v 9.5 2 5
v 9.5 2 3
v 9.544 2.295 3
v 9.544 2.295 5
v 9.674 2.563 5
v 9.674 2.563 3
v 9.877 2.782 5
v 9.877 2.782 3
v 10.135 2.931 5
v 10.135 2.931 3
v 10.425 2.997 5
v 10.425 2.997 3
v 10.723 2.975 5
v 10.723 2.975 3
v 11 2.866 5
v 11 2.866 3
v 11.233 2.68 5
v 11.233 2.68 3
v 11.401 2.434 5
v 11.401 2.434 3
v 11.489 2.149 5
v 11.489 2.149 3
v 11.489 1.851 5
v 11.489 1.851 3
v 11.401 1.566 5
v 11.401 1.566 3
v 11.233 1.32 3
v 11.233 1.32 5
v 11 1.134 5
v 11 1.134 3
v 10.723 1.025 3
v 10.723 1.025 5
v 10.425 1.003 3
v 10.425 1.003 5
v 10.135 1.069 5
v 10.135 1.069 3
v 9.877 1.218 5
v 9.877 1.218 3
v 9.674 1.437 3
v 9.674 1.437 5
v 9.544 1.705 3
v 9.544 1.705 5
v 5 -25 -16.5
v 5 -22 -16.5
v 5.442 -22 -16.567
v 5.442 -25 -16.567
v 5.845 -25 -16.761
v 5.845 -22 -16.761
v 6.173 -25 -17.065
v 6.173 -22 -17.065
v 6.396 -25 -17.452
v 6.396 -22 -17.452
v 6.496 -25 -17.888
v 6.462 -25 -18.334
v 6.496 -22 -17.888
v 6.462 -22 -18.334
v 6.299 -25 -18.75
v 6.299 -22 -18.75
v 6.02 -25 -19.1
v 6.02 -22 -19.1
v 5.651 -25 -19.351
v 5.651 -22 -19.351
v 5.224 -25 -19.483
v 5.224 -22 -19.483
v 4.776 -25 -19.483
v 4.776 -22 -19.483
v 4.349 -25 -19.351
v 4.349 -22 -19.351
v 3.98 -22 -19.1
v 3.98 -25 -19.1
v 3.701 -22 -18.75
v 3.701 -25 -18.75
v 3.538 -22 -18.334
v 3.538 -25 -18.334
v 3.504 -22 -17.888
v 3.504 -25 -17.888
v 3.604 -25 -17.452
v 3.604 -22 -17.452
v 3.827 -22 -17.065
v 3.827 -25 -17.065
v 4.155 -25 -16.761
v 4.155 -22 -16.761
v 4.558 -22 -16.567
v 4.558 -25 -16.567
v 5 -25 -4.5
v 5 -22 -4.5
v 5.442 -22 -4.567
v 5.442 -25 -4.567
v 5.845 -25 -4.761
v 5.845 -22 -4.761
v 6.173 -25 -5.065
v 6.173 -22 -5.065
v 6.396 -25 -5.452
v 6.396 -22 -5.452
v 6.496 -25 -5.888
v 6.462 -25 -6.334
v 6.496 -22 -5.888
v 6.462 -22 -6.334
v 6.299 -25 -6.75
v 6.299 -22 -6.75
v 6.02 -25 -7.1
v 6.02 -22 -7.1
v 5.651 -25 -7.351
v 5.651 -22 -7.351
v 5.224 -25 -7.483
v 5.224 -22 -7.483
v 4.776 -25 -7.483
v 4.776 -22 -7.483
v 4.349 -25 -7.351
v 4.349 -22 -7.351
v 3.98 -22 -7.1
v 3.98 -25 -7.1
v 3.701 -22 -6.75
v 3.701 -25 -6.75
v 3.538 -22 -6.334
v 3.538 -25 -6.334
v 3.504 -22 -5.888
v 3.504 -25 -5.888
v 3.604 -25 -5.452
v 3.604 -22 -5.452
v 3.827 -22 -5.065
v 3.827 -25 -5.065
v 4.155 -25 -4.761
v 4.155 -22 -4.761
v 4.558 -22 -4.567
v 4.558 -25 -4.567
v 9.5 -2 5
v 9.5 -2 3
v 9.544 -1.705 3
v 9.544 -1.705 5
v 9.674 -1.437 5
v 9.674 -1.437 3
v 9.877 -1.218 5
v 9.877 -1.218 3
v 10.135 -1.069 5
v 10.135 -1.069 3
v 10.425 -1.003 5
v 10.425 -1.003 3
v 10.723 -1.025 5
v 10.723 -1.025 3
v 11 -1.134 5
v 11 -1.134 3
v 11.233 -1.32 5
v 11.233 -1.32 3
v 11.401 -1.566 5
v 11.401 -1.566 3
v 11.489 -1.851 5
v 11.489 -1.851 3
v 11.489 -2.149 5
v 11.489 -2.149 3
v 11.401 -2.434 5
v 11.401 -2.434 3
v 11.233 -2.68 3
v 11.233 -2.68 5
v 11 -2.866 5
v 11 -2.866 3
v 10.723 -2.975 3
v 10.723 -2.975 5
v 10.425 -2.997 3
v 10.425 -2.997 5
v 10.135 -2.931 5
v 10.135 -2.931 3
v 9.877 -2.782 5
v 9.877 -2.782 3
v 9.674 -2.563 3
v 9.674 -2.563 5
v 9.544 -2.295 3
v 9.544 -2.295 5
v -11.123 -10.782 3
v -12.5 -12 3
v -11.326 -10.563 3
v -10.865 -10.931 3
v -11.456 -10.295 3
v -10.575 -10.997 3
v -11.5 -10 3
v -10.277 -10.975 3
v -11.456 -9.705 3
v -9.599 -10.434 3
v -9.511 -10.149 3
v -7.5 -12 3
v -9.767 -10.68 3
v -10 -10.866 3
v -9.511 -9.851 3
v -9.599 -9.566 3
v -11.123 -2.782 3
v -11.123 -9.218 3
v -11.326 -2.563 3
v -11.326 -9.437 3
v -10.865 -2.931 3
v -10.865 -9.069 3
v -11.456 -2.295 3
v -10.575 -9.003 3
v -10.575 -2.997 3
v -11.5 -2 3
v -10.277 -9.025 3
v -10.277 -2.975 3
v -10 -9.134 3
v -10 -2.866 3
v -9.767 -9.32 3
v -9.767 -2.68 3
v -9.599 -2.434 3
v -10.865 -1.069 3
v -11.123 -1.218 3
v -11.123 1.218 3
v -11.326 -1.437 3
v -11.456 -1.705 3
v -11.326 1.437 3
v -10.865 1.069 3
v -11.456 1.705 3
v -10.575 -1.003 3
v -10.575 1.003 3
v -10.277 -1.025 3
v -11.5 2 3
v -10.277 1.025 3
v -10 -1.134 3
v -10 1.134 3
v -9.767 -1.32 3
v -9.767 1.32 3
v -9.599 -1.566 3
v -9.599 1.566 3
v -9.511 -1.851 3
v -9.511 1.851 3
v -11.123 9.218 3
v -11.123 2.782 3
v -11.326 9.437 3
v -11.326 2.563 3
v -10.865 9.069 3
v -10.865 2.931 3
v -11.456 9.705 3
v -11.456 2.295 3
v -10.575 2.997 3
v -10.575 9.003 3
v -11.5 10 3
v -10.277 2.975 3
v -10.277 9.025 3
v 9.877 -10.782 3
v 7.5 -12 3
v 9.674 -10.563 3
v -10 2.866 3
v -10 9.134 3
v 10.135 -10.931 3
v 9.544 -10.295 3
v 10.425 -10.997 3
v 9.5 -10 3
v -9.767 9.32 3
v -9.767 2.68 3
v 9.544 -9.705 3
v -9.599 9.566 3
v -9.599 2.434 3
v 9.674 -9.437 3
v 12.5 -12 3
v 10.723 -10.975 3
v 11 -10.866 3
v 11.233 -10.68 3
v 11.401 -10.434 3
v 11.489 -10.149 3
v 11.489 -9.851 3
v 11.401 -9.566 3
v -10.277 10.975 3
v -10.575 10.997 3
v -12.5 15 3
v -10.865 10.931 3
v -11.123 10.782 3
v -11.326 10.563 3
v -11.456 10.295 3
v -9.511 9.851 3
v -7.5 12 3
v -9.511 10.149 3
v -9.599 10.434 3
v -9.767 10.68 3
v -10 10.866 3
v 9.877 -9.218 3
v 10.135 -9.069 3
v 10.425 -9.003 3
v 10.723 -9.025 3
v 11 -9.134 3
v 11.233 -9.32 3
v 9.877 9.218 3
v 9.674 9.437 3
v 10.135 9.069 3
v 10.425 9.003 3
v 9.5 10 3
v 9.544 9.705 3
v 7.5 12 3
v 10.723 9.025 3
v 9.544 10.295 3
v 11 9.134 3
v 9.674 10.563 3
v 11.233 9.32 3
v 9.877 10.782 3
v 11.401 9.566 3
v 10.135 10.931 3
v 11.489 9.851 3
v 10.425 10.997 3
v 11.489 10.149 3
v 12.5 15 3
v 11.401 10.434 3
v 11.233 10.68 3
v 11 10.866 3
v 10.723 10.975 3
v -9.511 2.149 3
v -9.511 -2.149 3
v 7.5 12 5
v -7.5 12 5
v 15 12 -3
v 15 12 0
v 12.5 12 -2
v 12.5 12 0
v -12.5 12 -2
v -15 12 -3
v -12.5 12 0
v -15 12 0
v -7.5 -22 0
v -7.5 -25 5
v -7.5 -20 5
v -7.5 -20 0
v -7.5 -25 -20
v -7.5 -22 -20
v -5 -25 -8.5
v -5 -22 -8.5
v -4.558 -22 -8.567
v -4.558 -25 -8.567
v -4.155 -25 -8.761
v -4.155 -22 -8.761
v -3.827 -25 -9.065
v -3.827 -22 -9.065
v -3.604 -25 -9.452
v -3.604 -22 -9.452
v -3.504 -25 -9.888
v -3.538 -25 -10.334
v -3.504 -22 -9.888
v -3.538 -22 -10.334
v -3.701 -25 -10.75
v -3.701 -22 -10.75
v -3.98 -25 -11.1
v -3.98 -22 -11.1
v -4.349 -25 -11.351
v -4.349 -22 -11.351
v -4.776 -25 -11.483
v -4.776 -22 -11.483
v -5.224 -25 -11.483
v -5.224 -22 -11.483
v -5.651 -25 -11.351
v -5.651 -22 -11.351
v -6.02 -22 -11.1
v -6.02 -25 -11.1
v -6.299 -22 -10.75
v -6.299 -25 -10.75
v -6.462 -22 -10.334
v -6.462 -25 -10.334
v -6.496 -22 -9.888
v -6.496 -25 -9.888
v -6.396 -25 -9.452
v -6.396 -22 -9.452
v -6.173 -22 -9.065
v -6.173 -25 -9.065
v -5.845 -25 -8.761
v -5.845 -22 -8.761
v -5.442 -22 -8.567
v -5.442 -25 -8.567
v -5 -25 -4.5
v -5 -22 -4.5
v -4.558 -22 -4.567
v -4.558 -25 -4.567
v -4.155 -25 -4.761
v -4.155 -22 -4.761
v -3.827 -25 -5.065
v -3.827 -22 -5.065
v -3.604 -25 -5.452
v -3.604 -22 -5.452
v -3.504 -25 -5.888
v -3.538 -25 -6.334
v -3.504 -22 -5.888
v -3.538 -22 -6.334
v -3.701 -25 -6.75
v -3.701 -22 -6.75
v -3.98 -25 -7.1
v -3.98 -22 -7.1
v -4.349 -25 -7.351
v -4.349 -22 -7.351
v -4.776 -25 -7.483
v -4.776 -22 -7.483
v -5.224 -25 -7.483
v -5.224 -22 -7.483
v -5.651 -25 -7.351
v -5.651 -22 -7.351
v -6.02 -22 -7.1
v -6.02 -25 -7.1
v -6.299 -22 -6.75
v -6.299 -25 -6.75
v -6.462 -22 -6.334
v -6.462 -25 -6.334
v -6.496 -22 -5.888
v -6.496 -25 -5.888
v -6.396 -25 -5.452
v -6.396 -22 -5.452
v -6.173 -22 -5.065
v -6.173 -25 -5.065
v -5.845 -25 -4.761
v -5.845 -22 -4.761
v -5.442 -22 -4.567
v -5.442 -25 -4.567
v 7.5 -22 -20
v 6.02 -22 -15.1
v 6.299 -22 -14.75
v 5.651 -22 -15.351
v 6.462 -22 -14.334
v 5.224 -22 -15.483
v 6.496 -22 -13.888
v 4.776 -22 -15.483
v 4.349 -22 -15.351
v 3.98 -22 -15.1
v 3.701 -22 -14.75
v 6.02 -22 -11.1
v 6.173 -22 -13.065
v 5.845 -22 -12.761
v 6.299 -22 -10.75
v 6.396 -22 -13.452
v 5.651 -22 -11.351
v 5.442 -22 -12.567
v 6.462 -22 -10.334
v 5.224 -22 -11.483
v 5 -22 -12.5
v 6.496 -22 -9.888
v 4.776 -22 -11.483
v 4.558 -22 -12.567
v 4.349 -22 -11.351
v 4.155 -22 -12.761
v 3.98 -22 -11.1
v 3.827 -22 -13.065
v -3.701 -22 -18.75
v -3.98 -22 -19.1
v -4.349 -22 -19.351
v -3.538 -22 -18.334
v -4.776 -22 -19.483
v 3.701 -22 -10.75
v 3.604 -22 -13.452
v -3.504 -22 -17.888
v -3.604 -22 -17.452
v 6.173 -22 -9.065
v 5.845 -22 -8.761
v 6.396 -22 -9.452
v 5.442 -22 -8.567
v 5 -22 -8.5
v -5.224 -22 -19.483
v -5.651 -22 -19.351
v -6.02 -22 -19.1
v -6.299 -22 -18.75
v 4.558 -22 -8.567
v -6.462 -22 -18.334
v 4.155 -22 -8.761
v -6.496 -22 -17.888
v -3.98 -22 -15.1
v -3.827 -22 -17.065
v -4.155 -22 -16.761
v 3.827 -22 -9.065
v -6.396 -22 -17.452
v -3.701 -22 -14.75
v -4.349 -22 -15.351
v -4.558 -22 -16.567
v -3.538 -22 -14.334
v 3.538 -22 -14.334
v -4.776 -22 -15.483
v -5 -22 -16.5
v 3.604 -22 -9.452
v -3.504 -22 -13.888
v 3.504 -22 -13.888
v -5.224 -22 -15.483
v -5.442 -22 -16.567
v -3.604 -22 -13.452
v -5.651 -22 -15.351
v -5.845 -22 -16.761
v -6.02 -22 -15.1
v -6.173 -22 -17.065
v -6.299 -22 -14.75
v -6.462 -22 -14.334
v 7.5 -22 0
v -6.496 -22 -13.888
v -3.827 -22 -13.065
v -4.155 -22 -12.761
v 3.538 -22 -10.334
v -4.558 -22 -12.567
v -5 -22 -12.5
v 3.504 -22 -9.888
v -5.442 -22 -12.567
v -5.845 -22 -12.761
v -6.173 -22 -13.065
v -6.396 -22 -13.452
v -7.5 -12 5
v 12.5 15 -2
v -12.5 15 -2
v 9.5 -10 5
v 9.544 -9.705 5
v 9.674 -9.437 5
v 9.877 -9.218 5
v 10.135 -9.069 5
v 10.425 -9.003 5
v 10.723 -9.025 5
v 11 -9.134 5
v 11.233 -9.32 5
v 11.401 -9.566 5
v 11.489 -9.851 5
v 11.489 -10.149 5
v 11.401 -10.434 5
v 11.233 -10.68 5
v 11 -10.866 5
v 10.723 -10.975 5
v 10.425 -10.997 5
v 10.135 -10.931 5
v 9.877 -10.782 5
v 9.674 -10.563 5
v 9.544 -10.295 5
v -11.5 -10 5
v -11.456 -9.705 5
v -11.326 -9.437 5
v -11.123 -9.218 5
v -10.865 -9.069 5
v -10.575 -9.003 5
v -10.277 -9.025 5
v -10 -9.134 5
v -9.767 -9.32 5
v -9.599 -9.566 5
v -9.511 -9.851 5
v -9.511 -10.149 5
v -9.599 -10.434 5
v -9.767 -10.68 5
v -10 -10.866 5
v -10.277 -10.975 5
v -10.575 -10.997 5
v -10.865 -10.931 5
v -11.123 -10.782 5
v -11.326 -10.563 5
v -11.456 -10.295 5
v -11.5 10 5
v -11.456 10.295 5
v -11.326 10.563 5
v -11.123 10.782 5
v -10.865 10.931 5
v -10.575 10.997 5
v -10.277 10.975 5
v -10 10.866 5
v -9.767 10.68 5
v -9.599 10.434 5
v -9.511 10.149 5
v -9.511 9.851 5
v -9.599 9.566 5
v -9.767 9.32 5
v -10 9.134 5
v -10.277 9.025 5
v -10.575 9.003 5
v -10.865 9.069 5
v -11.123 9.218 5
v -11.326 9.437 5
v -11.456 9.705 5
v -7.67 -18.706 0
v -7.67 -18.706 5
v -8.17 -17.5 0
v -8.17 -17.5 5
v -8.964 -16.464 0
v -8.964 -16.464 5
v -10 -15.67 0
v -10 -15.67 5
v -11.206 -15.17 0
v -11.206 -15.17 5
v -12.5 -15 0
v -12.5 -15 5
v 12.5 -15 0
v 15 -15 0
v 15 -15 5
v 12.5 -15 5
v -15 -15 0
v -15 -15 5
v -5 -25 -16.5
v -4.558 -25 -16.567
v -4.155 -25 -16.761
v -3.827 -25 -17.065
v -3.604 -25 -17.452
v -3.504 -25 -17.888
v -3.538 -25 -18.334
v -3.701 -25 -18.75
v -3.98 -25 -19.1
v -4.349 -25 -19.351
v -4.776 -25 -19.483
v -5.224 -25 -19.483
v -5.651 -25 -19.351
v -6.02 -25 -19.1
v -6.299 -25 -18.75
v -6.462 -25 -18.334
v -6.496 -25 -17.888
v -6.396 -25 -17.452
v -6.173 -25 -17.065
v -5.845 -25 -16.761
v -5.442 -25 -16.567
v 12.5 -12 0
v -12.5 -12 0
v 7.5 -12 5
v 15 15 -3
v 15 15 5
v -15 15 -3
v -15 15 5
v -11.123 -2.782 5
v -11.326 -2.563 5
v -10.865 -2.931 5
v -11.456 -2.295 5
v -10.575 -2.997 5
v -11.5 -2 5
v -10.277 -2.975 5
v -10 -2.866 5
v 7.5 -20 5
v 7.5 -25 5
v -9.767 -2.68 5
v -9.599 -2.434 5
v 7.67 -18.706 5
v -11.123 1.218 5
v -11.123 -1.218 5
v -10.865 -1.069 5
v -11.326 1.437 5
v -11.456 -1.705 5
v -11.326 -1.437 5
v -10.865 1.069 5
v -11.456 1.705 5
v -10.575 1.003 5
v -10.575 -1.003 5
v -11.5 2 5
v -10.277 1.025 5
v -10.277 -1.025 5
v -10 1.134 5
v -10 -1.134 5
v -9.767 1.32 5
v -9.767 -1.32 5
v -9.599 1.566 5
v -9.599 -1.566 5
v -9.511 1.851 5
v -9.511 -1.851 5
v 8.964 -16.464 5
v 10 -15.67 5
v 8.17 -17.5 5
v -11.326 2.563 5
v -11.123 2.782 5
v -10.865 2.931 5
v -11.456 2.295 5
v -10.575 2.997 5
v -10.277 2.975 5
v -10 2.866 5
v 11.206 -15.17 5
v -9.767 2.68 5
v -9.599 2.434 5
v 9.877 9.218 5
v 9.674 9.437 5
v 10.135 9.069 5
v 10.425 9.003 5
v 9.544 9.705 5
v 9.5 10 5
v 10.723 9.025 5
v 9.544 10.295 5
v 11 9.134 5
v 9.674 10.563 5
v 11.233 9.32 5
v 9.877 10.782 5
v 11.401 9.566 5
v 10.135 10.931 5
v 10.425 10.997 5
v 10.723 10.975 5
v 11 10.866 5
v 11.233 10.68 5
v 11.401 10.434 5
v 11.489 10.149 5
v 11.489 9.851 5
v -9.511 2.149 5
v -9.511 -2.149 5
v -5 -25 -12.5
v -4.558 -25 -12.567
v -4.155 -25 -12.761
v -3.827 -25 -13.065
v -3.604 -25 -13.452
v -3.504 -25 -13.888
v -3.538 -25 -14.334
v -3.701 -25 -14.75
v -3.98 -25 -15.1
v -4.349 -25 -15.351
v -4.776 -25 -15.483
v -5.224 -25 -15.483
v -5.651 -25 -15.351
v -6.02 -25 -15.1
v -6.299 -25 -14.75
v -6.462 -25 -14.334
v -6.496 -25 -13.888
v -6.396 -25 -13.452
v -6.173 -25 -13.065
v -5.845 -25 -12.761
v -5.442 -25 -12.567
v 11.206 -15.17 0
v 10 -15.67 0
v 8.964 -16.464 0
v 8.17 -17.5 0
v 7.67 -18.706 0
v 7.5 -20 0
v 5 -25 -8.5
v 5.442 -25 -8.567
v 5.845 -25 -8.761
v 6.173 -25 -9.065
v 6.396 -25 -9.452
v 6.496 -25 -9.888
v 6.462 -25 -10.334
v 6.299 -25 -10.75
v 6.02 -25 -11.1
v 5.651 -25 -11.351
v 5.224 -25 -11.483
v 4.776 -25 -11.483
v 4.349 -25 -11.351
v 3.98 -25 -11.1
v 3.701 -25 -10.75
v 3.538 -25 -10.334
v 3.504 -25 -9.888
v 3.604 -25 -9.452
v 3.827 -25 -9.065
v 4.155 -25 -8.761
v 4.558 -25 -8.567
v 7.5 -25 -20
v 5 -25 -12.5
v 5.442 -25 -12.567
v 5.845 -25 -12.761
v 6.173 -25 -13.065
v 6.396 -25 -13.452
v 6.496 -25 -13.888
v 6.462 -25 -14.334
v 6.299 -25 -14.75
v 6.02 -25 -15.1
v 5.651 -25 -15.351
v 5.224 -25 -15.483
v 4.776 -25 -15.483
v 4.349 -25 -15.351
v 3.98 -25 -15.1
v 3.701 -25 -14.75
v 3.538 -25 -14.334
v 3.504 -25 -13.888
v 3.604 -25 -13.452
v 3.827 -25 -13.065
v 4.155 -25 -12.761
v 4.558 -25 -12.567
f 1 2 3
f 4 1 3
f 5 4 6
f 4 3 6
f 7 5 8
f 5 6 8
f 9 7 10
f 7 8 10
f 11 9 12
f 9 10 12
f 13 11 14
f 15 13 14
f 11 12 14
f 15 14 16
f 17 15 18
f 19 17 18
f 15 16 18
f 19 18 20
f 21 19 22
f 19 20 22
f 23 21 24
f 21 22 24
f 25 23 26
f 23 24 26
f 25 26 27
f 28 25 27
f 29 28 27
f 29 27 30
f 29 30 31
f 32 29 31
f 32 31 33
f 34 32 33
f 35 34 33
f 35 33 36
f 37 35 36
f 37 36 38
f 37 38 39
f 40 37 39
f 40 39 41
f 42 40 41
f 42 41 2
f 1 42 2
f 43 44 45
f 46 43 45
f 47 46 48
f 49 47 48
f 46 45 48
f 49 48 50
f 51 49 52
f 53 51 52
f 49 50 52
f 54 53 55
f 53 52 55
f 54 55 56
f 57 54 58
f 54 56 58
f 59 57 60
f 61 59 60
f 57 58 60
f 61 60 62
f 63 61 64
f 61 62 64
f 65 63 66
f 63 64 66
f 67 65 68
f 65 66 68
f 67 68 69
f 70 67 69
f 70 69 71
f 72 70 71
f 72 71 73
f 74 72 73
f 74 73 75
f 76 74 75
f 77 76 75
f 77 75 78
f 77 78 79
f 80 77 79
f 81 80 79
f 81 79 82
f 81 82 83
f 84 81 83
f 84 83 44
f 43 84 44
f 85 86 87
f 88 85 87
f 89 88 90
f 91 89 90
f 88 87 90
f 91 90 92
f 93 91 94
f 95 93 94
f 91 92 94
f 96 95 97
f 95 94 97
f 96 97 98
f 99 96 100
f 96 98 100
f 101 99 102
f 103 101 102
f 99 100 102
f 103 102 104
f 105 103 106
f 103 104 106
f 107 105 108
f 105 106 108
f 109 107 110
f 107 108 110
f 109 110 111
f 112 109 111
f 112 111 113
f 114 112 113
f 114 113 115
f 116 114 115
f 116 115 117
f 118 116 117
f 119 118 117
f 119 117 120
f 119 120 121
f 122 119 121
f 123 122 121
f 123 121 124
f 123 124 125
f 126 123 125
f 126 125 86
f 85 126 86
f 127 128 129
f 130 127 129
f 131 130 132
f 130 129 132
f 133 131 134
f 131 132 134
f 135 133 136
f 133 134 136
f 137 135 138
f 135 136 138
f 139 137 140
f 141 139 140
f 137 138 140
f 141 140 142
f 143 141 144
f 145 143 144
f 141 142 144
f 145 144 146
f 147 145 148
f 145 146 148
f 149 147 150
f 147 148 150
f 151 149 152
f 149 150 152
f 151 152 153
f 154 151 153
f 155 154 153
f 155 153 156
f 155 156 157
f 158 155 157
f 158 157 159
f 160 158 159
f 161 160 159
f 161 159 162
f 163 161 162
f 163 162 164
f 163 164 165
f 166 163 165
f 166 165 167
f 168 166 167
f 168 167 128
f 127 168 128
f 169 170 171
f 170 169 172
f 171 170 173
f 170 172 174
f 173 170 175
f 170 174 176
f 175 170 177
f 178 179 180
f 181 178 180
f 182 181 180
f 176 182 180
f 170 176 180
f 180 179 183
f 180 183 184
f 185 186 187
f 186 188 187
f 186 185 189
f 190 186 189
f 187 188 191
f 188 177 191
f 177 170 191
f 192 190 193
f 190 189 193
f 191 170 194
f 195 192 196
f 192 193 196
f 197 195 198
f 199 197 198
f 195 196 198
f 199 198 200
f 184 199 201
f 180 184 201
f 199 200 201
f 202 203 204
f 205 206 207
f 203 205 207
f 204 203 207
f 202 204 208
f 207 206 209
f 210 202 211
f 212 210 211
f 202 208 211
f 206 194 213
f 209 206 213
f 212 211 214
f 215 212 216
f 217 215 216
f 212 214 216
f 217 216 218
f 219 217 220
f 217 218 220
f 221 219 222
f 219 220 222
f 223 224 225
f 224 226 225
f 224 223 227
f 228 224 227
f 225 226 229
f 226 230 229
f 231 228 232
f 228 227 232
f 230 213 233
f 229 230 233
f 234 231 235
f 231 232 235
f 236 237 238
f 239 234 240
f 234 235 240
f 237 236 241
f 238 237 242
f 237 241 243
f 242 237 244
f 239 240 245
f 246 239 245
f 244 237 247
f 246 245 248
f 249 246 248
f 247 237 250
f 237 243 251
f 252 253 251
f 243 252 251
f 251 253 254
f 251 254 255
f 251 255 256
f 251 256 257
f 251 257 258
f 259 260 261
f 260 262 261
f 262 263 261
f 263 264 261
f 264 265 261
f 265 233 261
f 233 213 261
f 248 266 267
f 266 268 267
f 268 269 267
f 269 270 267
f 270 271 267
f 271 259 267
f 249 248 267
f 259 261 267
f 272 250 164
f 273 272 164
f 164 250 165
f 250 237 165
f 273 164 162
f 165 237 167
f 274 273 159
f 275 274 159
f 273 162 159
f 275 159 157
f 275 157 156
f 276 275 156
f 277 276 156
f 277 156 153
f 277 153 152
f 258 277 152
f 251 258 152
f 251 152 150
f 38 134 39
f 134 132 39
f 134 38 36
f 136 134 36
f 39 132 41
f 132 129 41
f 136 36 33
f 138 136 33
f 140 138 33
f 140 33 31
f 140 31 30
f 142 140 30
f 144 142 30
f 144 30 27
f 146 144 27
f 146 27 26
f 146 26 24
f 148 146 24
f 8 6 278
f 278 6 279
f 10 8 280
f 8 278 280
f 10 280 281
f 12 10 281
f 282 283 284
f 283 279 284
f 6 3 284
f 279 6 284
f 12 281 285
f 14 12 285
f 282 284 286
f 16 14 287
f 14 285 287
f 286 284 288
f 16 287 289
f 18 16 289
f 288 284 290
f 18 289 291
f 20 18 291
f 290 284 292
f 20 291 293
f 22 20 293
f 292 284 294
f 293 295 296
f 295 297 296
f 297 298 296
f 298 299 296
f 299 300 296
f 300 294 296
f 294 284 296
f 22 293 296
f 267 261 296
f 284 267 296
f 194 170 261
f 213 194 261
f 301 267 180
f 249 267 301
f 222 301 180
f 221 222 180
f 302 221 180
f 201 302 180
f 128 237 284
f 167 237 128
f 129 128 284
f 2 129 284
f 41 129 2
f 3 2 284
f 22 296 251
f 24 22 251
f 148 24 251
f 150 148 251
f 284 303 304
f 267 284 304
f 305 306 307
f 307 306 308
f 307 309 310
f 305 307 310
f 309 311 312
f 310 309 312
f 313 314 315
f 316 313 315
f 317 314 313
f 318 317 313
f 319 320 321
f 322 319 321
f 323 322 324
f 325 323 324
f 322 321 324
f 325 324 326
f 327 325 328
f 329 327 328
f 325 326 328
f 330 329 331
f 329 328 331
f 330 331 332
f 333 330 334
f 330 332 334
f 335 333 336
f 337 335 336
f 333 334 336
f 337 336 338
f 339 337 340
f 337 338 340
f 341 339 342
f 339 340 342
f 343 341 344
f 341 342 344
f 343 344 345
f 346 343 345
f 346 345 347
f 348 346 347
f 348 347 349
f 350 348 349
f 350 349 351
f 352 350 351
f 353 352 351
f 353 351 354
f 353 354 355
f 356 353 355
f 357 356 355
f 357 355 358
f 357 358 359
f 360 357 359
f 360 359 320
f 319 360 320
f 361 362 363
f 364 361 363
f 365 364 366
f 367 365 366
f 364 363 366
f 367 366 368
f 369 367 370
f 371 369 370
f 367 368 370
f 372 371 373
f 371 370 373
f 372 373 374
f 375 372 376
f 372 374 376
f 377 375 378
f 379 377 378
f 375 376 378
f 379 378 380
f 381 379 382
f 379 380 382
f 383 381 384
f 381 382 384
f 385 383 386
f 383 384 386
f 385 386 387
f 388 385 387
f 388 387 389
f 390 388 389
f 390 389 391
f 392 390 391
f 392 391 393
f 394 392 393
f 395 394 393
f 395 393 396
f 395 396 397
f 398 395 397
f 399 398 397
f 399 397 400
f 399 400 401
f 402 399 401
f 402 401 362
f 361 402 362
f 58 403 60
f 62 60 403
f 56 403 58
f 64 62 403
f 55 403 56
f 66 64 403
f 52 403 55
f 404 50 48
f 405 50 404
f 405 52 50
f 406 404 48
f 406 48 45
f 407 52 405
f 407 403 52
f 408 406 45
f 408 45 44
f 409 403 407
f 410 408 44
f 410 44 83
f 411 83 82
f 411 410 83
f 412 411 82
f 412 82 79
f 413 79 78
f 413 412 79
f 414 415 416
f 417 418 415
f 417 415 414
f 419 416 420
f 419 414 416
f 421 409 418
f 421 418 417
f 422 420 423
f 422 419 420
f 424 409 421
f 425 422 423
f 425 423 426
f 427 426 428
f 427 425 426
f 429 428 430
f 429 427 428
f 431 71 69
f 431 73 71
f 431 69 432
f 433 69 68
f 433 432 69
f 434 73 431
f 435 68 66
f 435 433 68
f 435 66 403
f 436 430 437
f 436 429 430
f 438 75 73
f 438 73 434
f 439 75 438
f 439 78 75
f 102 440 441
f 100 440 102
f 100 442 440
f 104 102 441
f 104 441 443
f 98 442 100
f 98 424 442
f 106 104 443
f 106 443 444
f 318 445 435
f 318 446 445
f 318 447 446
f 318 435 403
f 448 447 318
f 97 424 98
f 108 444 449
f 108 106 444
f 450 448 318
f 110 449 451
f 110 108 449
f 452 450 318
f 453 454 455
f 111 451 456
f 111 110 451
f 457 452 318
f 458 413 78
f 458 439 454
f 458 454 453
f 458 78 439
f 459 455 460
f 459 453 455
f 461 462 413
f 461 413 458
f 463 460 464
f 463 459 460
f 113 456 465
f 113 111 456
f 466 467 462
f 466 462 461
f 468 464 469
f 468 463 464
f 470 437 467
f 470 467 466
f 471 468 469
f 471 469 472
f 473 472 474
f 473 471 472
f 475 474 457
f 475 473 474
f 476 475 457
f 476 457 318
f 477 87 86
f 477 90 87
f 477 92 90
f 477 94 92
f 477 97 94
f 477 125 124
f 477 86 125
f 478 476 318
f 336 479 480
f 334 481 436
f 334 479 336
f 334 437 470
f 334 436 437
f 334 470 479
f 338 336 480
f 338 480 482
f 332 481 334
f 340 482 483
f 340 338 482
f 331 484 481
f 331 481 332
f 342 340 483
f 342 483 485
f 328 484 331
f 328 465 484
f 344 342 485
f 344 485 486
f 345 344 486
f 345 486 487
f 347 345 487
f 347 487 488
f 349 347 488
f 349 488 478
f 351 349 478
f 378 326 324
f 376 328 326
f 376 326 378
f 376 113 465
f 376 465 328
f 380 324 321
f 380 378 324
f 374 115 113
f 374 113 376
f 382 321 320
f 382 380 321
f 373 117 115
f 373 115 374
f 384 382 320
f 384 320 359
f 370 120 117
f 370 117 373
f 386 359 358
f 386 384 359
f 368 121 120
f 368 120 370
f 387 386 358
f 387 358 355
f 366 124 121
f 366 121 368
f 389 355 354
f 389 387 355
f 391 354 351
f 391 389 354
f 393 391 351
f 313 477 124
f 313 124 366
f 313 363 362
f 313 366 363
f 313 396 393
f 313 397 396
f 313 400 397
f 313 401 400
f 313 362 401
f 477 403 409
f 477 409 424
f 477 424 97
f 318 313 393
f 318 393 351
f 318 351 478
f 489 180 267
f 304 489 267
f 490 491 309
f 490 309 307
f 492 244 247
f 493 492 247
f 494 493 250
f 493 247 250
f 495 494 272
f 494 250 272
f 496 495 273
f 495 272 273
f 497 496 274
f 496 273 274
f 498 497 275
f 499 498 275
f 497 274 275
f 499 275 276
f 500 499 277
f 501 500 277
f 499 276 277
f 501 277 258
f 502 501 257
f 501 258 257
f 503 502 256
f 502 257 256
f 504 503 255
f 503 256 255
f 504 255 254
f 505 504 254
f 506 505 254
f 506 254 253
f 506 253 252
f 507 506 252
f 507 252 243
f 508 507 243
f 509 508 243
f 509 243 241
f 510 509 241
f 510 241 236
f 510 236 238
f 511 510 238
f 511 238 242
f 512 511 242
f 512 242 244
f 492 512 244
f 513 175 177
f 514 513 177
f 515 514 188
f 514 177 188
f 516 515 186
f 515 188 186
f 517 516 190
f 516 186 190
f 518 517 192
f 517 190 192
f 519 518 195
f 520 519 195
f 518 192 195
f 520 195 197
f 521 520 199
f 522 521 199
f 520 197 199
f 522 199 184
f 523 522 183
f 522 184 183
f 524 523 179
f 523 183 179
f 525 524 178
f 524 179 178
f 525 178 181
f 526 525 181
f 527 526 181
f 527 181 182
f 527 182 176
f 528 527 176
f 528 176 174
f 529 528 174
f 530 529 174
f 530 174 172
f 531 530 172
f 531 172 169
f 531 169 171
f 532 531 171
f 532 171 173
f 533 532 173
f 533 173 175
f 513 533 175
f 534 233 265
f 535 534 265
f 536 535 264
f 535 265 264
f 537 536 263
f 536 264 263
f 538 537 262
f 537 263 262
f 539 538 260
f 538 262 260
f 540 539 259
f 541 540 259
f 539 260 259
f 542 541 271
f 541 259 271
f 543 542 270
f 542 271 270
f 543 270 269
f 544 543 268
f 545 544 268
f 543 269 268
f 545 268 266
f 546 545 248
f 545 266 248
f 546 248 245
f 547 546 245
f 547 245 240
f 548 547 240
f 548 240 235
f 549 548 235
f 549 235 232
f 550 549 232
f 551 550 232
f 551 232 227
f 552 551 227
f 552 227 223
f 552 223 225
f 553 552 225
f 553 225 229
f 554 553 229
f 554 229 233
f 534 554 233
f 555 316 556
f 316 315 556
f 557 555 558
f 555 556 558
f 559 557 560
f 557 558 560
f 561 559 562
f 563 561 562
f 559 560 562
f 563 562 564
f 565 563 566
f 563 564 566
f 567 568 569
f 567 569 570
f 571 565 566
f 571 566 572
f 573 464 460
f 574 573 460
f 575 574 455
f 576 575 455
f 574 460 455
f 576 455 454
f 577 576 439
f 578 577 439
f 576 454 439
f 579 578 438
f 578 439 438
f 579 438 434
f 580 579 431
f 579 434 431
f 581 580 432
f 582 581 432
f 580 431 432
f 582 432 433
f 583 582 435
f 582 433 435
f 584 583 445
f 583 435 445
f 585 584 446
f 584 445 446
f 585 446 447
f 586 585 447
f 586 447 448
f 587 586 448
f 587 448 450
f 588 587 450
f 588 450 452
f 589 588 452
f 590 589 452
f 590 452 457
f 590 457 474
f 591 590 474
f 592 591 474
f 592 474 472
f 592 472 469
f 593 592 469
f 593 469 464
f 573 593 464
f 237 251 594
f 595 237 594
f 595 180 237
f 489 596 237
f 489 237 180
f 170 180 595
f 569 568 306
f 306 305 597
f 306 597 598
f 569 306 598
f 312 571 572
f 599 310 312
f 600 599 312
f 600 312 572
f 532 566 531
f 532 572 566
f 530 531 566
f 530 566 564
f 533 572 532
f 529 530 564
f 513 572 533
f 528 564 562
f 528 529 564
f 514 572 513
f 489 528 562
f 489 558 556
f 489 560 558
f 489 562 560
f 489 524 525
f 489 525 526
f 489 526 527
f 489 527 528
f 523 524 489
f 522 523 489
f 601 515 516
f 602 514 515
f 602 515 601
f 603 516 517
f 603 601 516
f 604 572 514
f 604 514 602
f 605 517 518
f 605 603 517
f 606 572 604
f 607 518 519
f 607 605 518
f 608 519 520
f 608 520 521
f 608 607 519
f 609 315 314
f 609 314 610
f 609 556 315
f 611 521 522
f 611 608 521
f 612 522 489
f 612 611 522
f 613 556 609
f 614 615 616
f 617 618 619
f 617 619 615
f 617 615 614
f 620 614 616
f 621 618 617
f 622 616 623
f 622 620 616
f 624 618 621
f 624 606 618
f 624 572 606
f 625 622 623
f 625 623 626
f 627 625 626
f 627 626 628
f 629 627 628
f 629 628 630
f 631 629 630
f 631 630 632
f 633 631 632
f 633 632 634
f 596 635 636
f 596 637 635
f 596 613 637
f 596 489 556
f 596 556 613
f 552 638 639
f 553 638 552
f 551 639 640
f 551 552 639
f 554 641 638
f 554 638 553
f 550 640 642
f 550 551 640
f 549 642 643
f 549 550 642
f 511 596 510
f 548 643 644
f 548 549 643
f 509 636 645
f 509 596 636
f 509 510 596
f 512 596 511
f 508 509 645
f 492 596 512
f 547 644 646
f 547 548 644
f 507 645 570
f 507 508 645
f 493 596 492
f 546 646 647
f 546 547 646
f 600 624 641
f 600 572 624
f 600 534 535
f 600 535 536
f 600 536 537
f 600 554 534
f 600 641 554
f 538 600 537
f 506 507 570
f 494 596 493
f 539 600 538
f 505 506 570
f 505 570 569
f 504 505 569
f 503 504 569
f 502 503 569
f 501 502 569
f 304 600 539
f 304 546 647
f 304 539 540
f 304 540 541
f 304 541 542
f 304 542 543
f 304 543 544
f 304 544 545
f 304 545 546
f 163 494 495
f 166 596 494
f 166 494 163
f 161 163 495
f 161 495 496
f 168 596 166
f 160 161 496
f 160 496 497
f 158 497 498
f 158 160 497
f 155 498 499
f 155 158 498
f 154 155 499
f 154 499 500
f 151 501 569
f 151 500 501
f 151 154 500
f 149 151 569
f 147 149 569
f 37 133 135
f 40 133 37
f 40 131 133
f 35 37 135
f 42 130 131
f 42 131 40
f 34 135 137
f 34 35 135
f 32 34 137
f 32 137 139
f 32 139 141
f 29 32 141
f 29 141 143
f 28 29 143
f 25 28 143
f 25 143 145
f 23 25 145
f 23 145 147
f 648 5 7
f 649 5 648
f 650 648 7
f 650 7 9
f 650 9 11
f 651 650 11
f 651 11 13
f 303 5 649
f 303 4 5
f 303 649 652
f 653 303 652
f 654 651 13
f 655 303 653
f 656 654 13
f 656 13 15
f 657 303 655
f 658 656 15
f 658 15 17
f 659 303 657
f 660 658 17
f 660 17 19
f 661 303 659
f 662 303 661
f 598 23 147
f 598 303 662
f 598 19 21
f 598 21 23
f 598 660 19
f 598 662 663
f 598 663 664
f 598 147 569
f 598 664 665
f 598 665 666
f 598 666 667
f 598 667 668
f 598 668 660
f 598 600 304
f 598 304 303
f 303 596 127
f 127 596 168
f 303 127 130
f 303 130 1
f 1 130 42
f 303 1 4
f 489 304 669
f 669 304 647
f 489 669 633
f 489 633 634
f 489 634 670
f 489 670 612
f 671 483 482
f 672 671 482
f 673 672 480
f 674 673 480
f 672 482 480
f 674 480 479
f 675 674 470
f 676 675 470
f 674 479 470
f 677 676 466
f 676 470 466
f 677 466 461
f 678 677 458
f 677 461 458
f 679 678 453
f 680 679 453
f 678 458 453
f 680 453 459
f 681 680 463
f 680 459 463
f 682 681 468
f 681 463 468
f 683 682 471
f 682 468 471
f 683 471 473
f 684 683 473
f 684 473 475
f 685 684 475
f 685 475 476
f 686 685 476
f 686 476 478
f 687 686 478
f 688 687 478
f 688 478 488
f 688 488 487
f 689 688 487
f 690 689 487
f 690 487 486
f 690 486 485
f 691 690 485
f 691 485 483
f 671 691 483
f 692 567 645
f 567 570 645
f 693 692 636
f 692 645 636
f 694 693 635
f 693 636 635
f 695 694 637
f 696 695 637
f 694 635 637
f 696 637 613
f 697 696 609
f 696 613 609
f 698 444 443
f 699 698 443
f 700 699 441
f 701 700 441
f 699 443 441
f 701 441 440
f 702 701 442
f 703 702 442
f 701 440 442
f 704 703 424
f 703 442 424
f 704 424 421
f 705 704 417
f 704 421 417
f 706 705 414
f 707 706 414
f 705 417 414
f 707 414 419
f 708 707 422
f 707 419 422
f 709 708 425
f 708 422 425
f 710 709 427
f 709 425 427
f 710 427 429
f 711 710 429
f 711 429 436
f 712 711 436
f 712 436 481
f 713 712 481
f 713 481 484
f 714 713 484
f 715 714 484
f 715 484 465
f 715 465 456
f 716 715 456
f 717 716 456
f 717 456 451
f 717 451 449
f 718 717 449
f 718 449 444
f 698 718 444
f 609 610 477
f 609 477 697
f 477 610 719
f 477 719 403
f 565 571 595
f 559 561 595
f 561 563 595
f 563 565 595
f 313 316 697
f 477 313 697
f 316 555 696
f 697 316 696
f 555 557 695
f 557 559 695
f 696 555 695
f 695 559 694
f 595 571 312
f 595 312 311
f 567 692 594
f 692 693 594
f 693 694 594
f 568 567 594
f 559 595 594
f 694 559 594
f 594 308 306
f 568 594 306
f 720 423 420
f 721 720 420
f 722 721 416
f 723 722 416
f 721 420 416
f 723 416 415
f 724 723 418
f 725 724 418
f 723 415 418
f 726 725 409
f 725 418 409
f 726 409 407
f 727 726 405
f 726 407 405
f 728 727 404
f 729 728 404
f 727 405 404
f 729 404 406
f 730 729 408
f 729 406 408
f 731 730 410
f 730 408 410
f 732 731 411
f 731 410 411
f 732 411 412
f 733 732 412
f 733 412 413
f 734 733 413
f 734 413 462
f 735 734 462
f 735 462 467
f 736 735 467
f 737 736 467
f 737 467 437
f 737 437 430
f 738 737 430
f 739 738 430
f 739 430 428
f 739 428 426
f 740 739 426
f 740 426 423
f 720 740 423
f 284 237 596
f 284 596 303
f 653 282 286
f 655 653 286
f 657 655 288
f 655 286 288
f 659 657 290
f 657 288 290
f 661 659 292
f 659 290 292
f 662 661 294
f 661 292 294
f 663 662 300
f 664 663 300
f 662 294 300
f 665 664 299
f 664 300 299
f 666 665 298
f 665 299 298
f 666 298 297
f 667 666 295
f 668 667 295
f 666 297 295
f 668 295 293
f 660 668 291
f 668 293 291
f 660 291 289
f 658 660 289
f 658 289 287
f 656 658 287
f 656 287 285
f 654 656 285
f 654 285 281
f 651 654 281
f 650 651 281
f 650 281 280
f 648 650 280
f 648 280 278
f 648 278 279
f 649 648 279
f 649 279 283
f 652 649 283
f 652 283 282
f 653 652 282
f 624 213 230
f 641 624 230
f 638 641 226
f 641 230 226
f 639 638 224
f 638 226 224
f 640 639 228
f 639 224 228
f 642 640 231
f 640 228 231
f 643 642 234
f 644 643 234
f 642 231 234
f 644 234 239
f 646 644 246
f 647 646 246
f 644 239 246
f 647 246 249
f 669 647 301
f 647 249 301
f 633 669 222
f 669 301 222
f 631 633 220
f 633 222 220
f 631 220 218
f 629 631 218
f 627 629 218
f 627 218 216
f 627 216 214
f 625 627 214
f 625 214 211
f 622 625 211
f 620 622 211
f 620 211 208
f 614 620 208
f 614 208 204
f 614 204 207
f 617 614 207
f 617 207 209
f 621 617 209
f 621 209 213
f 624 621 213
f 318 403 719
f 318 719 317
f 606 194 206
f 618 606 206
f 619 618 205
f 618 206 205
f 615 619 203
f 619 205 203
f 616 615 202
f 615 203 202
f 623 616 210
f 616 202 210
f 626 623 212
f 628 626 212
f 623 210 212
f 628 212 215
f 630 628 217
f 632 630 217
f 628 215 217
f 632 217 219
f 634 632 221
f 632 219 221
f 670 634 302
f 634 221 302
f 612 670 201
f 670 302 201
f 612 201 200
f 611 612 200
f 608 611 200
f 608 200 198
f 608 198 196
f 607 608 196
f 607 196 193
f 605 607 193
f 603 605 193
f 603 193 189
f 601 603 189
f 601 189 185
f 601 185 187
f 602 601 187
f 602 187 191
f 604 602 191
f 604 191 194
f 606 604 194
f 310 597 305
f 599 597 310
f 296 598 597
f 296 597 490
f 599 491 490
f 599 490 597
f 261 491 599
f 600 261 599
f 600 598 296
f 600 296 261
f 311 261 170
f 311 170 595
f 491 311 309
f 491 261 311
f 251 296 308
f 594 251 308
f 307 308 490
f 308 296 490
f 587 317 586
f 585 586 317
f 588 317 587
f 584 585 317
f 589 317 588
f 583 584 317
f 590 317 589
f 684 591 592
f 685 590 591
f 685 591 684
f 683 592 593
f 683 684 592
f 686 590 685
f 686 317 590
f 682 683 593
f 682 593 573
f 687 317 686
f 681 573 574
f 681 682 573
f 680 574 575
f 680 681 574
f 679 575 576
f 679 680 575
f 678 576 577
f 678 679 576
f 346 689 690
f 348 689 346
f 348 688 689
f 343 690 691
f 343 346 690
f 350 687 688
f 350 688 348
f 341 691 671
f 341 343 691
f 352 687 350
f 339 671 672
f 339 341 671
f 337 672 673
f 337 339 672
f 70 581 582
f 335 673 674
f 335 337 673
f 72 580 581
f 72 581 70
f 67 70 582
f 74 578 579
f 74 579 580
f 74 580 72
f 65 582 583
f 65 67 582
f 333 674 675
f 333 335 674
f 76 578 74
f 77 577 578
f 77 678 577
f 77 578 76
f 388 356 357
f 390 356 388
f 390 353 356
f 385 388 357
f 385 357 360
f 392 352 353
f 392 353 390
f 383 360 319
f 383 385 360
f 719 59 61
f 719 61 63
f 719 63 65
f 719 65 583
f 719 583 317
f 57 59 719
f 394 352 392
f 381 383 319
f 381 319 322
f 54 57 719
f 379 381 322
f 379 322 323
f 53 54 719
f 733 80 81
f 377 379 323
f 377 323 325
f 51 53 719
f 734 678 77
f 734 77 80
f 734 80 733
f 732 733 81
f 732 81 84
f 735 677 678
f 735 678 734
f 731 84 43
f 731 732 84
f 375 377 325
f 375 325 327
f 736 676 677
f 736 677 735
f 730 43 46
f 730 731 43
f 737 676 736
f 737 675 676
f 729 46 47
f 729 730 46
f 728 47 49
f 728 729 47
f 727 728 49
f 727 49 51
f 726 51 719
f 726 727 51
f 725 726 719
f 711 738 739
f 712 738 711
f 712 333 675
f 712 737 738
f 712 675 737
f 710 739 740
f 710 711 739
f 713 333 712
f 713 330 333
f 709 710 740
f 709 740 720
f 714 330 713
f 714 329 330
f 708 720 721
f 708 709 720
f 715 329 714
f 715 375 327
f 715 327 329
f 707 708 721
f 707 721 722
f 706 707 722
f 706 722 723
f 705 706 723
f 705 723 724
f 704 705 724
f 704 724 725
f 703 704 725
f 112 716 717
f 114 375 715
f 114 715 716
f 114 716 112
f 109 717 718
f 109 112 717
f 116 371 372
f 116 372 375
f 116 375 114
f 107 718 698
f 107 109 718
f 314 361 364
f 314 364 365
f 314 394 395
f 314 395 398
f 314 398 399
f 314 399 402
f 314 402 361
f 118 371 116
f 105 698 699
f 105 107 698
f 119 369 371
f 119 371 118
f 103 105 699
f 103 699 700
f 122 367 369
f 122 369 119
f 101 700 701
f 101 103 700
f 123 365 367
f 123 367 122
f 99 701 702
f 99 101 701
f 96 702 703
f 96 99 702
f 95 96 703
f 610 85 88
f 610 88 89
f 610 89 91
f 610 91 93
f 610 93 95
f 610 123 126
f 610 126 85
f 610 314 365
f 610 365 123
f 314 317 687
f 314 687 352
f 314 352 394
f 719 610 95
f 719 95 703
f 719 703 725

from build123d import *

# Parameters (mm, degrees)
SKETCH1_W           = 30
SKETCH1_H           = 30
BOSS_EXTRUDE1_DEPTH = 5
SKETCH2_W           = 25
SKETCH2_H           = 24
CUT_EXTRUDE1_DEPTH  = 3
SKETCH3_W           = 15
SKETCH3_H           = 24
CUT_EXTRUDE2_DEPTH  = 22.424285286
SKETCH4_R           = 1
CUT_EXTRUDE3_DEPTH  = 22.424285286
SKETCH5_W           = 30
SKETCH5_H           = 3
BOSS_EXTRUDE2_DEPTH = 3
SKETCH6_R           = 1
CUT_EXTRUDE4_DEPTH  = 23.045407685
SKETCH7_W           = 25
SKETCH7_H           = 5
CUT_EXTRUDE5_DEPTH  = 4
SKETCH8_W           = 30
SKETCH8_H           = 3
CUT_EXTRUDE7_DEPTH  = 3
SKETCH9_W           = 30
SKETCH9_H           = 5
BOSS_EXTRUDE3_DEPTH = 10
SKETCH12_W          = 15
SKETCH12_H          = 3
BOSS_EXTRUDE5_DEPTH = 20
SKETCH13_W          = 7.5
SKETCH13_H          = 10
CUT_EXTRUDE9_DEPTH  = 36.355339059
SKETCH14_R          = 1.5
CUT_EXTRUDE10_DEPTH = 45.654227124
FILLET1_R           = 5
FILLET2_R           = 5


with BuildPart() as part:
    # Sketch1 → Boss-Extrude1 (new body)
    with BuildSketch(Plane.XY):
        Rectangle(SKETCH1_W, SKETCH1_H)
    extrude(amount=BOSS_EXTRUDE1_DEPTH)

    # Sketch2 → Cut-Extrude1 (cut)
    with BuildSketch(Plane(origin=(0, 0, 0), x_dir=(-1, 0, 0), z_dir=(0, 0, -1))):
        Rectangle(SKETCH2_W, SKETCH2_H)
    extrude(amount=-CUT_EXTRUDE1_DEPTH, mode=Mode.SUBTRACT)

    # Sketch3 → Cut-Extrude2 (cut, through all)
    with BuildSketch(Plane(origin=(0, 0, 3), x_dir=(-1, 0, 0), z_dir=(0, 0, -1))):
        Rectangle(SKETCH3_W, SKETCH3_H)
    extrude(amount=-CUT_EXTRUDE2_DEPTH, mode=Mode.SUBTRACT)

    # Sketch4 → Cut-Extrude3 (cut, through all)
    with BuildSketch(Plane(origin=(0, 0, 3), x_dir=(-1, 0, 0), z_dir=(0, 0, -1))):
        with Locations((10.5, 10)):
            Circle(SKETCH4_R)
        with Locations((10.5, -10)):
            Circle(SKETCH4_R)
        with Locations((-10.5, 10)):
            Circle(SKETCH4_R)
        with Locations((-10.5, -10)):
            Circle(SKETCH4_R)
    extrude(amount=-CUT_EXTRUDE3_DEPTH, mode=Mode.SUBTRACT)

    # Sketch5 → Boss-Extrude2 (add)
    with BuildSketch(Plane(origin=(0, 0, 0), x_dir=(-1, 0, 0), z_dir=(0, 0, -1))):
        with Locations((0, 13.5)):
            Rectangle(SKETCH5_W, SKETCH5_H)
        with Locations((0, -13.5)):
            Rectangle(SKETCH5_W, SKETCH5_H)
    extrude(amount=BOSS_EXTRUDE2_DEPTH)

    # Sketch6 → Cut-Extrude4 (cut, through all)
    with BuildSketch(Plane(origin=(0, 0, 3), x_dir=(-1, 0, 0), z_dir=(0, 0, -1))):
        with Locations((-10.5, 2)):
            Circle(SKETCH6_R)
        with Locations((-10.5, -2)):
            Circle(SKETCH6_R)
        with Locations((10.5, 2)):
            Circle(SKETCH6_R)
        with Locations((10.5, -2)):
            Circle(SKETCH6_R)
    extrude(amount=-CUT_EXTRUDE4_DEPTH, mode=Mode.SUBTRACT)

    # Sketch7 → Cut-Extrude5 (cut)
    with BuildSketch(Plane(origin=(0, 15, 0), x_dir=(1, 0, 0), z_dir=(0, 1, 0))):
        with Locations((0, -0.5)):
            Rectangle(SKETCH7_W, SKETCH7_H)
    extrude(amount=-CUT_EXTRUDE5_DEPTH, mode=Mode.SUBTRACT)

    # Sketch8 → Cut-Extrude7 (cut)
    with BuildSketch(Plane(origin=(0, 0, -3), x_dir=(-1, 0, 0), z_dir=(0, 0, -1))):
        with Locations((0, -13.5)):
            Rectangle(SKETCH8_W, SKETCH8_H)
    extrude(amount=-CUT_EXTRUDE7_DEPTH, mode=Mode.SUBTRACT)

    # Sketch9 → Boss-Extrude3 (add)
    with BuildSketch(Plane.XZ.offset(15)):
        with Locations((0, 2.5)):
            Rectangle(SKETCH9_W, SKETCH9_H)
    extrude(amount=BOSS_EXTRUDE3_DEPTH)

    # Sketch12 → Boss-Extrude5 (add)
    with BuildSketch(Plane(origin=(0, 0, 0), x_dir=(-1, 0, 0), z_dir=(0, 0, -1))):
        with Locations((0, -23.5)):
            Rectangle(SKETCH12_W, SKETCH12_H)
    extrude(amount=BOSS_EXTRUDE5_DEPTH)

    # Sketch13 → Cut-Extrude9 (cut, through all)
    with BuildSketch(Plane(origin=(0, 0, 0), x_dir=(-1, 0, 0), z_dir=(0, 0, -1))):
        with Locations((-11.25, -20)):
            Rectangle(SKETCH13_W, SKETCH13_H)
        with Locations((11.25, -20)):
            Rectangle(SKETCH13_W, SKETCH13_H)
    extrude(amount=-CUT_EXTRUDE9_DEPTH, mode=Mode.SUBTRACT)

    # Sketch14 → Cut-Extrude10 (cut, through all)
    with BuildSketch(Plane(origin=(0, -22, 0), x_dir=(1, 0, 0), z_dir=(0, 1, 0))):
        with Locations(Location((-5, 6, 0), (0, 0, 270))):
            Circle(SKETCH14_R)
        with Locations(Location((-5, 10, 0), (0, 0, 270))):
            Circle(SKETCH14_R)
        with Locations(Location((-5, 14, 0), (0, 0, 270))):
            Circle(SKETCH14_R)
        with Locations(Location((-5, 18, 0), (0, 0, 270))):
            Circle(SKETCH14_R)
        with Locations(Location((5, 6, 0), (0, 0, 270))):
            Circle(SKETCH14_R)
        with Locations(Location((5, 10, 0), (0, 0, 270))):
            Circle(SKETCH14_R)
        with Locations(Location((5, 14, 0), (0, 0, 270))):
            Circle(SKETCH14_R)
        with Locations(Location((5, 18, 0), (0, 0, 270))):
            Circle(SKETCH14_R)
    extrude(amount=-CUT_EXTRUDE10_DEPTH, mode=Mode.SUBTRACT)

    # Fillet1
    fillet1_edges = [part.edges().sort_by_distance(p)[0] for p in [
        (7.5, -15, 2.5),
    ]]
    fillet(fillet1_edges, radius=FILLET1_R)

    # Fillet2
    fillet2_edges = [part.edges().sort_by_distance(p)[0] for p in [
        (-7.5, -15, 2.5),
    ]]
    fillet(fillet2_edges, radius=FILLET2_R)


solid = part.part
